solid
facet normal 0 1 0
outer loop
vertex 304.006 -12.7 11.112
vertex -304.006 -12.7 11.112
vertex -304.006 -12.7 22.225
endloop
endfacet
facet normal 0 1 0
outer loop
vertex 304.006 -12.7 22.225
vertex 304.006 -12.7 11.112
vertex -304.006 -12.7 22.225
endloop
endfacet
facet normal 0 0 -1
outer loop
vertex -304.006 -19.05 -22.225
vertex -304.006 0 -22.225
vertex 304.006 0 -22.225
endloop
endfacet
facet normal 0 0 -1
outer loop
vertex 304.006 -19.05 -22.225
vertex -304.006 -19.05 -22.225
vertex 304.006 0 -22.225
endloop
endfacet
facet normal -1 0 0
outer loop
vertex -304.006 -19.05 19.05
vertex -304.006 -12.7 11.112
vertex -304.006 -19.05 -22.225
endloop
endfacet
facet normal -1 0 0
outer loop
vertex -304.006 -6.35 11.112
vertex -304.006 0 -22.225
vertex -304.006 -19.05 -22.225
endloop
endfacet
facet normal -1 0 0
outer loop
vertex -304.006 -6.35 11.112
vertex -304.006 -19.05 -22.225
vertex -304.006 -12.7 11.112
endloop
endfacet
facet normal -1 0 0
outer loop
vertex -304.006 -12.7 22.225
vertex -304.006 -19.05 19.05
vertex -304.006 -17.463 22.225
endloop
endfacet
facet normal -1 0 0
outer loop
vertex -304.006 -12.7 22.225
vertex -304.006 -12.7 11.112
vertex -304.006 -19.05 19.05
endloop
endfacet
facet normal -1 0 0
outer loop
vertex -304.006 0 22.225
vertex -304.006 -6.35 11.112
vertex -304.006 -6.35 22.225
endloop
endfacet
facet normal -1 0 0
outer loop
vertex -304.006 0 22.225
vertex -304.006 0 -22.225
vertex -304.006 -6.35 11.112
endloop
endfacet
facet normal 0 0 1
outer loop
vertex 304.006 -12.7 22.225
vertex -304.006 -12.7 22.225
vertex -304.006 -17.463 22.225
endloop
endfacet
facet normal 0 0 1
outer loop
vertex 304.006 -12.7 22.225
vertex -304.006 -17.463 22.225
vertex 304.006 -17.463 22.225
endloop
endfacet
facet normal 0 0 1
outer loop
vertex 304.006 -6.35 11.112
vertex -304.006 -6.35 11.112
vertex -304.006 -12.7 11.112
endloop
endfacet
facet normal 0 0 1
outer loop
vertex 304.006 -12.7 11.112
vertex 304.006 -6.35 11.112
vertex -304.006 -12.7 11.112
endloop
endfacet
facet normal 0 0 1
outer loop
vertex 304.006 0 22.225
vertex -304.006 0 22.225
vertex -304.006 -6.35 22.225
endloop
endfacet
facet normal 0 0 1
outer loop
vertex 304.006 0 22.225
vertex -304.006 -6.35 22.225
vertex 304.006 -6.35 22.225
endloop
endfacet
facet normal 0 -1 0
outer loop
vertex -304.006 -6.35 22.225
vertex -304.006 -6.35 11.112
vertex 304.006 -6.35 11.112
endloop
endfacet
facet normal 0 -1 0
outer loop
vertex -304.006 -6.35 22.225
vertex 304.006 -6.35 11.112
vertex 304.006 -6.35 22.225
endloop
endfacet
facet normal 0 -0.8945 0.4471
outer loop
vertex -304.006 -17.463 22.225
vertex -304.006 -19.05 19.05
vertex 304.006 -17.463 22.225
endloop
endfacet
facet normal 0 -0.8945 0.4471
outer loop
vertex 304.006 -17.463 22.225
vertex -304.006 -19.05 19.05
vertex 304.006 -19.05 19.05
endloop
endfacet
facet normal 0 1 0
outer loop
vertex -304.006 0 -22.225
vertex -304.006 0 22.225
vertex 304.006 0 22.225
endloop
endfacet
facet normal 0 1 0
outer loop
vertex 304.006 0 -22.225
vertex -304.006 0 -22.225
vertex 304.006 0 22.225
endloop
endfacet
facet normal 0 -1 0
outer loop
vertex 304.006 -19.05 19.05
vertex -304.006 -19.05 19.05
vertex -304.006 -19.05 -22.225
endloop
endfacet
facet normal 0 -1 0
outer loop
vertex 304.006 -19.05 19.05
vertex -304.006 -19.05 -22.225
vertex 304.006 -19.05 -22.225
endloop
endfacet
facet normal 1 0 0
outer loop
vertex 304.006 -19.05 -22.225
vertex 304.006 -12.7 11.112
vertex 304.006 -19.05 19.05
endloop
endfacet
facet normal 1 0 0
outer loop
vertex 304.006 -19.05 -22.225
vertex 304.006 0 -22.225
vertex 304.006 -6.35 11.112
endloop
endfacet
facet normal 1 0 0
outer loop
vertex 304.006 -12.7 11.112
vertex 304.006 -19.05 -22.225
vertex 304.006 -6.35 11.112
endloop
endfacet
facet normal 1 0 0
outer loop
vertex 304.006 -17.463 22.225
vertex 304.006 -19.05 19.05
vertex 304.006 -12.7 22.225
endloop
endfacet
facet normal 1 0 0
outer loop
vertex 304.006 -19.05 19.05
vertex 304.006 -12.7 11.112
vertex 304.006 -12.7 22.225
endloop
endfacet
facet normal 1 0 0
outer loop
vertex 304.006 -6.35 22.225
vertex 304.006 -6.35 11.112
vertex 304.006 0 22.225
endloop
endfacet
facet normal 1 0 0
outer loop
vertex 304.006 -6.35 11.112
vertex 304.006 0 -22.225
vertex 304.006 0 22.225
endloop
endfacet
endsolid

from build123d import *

# Parameters (mm, degrees)
F0_W     = 608.0125
F0_H     = 44.45
F1_DEPTH = 19.05
F2_W     = 6.35
F2_H     = 11.1125
F3_DEPTH = 608.0135
F4_SIZE2 = 3.175
F4_SIZE  = 1.5875


with BuildPart() as f1:
    # F0 (on Front) → F1 (new body)
    with BuildSketch(Plane.XZ):
        Rectangle(F0_W, F0_H)
    extrude(amount=F1_DEPTH)

    # F2 (on face) → F3 (cut, through all)
    with BuildSketch(Plane(origin=(-304.00625, 0, 0), x_dir=(0, -1, 0), z_dir=(-1, 0, 0))):
        with Locations((9.525, 16.66875)):
            Rectangle(F2_W, F2_H)
    extrude(amount=-F3_DEPTH, mode=Mode.SUBTRACT)

    # F4
    f4_edges = [f1.edges().sort_by_distance(p)[0] for p in [
        (0, -19.05, 22.225),
    ]]
    chamfer(f4_edges, length=F4_SIZE, length2=F4_SIZE2)


solid = f1.part
